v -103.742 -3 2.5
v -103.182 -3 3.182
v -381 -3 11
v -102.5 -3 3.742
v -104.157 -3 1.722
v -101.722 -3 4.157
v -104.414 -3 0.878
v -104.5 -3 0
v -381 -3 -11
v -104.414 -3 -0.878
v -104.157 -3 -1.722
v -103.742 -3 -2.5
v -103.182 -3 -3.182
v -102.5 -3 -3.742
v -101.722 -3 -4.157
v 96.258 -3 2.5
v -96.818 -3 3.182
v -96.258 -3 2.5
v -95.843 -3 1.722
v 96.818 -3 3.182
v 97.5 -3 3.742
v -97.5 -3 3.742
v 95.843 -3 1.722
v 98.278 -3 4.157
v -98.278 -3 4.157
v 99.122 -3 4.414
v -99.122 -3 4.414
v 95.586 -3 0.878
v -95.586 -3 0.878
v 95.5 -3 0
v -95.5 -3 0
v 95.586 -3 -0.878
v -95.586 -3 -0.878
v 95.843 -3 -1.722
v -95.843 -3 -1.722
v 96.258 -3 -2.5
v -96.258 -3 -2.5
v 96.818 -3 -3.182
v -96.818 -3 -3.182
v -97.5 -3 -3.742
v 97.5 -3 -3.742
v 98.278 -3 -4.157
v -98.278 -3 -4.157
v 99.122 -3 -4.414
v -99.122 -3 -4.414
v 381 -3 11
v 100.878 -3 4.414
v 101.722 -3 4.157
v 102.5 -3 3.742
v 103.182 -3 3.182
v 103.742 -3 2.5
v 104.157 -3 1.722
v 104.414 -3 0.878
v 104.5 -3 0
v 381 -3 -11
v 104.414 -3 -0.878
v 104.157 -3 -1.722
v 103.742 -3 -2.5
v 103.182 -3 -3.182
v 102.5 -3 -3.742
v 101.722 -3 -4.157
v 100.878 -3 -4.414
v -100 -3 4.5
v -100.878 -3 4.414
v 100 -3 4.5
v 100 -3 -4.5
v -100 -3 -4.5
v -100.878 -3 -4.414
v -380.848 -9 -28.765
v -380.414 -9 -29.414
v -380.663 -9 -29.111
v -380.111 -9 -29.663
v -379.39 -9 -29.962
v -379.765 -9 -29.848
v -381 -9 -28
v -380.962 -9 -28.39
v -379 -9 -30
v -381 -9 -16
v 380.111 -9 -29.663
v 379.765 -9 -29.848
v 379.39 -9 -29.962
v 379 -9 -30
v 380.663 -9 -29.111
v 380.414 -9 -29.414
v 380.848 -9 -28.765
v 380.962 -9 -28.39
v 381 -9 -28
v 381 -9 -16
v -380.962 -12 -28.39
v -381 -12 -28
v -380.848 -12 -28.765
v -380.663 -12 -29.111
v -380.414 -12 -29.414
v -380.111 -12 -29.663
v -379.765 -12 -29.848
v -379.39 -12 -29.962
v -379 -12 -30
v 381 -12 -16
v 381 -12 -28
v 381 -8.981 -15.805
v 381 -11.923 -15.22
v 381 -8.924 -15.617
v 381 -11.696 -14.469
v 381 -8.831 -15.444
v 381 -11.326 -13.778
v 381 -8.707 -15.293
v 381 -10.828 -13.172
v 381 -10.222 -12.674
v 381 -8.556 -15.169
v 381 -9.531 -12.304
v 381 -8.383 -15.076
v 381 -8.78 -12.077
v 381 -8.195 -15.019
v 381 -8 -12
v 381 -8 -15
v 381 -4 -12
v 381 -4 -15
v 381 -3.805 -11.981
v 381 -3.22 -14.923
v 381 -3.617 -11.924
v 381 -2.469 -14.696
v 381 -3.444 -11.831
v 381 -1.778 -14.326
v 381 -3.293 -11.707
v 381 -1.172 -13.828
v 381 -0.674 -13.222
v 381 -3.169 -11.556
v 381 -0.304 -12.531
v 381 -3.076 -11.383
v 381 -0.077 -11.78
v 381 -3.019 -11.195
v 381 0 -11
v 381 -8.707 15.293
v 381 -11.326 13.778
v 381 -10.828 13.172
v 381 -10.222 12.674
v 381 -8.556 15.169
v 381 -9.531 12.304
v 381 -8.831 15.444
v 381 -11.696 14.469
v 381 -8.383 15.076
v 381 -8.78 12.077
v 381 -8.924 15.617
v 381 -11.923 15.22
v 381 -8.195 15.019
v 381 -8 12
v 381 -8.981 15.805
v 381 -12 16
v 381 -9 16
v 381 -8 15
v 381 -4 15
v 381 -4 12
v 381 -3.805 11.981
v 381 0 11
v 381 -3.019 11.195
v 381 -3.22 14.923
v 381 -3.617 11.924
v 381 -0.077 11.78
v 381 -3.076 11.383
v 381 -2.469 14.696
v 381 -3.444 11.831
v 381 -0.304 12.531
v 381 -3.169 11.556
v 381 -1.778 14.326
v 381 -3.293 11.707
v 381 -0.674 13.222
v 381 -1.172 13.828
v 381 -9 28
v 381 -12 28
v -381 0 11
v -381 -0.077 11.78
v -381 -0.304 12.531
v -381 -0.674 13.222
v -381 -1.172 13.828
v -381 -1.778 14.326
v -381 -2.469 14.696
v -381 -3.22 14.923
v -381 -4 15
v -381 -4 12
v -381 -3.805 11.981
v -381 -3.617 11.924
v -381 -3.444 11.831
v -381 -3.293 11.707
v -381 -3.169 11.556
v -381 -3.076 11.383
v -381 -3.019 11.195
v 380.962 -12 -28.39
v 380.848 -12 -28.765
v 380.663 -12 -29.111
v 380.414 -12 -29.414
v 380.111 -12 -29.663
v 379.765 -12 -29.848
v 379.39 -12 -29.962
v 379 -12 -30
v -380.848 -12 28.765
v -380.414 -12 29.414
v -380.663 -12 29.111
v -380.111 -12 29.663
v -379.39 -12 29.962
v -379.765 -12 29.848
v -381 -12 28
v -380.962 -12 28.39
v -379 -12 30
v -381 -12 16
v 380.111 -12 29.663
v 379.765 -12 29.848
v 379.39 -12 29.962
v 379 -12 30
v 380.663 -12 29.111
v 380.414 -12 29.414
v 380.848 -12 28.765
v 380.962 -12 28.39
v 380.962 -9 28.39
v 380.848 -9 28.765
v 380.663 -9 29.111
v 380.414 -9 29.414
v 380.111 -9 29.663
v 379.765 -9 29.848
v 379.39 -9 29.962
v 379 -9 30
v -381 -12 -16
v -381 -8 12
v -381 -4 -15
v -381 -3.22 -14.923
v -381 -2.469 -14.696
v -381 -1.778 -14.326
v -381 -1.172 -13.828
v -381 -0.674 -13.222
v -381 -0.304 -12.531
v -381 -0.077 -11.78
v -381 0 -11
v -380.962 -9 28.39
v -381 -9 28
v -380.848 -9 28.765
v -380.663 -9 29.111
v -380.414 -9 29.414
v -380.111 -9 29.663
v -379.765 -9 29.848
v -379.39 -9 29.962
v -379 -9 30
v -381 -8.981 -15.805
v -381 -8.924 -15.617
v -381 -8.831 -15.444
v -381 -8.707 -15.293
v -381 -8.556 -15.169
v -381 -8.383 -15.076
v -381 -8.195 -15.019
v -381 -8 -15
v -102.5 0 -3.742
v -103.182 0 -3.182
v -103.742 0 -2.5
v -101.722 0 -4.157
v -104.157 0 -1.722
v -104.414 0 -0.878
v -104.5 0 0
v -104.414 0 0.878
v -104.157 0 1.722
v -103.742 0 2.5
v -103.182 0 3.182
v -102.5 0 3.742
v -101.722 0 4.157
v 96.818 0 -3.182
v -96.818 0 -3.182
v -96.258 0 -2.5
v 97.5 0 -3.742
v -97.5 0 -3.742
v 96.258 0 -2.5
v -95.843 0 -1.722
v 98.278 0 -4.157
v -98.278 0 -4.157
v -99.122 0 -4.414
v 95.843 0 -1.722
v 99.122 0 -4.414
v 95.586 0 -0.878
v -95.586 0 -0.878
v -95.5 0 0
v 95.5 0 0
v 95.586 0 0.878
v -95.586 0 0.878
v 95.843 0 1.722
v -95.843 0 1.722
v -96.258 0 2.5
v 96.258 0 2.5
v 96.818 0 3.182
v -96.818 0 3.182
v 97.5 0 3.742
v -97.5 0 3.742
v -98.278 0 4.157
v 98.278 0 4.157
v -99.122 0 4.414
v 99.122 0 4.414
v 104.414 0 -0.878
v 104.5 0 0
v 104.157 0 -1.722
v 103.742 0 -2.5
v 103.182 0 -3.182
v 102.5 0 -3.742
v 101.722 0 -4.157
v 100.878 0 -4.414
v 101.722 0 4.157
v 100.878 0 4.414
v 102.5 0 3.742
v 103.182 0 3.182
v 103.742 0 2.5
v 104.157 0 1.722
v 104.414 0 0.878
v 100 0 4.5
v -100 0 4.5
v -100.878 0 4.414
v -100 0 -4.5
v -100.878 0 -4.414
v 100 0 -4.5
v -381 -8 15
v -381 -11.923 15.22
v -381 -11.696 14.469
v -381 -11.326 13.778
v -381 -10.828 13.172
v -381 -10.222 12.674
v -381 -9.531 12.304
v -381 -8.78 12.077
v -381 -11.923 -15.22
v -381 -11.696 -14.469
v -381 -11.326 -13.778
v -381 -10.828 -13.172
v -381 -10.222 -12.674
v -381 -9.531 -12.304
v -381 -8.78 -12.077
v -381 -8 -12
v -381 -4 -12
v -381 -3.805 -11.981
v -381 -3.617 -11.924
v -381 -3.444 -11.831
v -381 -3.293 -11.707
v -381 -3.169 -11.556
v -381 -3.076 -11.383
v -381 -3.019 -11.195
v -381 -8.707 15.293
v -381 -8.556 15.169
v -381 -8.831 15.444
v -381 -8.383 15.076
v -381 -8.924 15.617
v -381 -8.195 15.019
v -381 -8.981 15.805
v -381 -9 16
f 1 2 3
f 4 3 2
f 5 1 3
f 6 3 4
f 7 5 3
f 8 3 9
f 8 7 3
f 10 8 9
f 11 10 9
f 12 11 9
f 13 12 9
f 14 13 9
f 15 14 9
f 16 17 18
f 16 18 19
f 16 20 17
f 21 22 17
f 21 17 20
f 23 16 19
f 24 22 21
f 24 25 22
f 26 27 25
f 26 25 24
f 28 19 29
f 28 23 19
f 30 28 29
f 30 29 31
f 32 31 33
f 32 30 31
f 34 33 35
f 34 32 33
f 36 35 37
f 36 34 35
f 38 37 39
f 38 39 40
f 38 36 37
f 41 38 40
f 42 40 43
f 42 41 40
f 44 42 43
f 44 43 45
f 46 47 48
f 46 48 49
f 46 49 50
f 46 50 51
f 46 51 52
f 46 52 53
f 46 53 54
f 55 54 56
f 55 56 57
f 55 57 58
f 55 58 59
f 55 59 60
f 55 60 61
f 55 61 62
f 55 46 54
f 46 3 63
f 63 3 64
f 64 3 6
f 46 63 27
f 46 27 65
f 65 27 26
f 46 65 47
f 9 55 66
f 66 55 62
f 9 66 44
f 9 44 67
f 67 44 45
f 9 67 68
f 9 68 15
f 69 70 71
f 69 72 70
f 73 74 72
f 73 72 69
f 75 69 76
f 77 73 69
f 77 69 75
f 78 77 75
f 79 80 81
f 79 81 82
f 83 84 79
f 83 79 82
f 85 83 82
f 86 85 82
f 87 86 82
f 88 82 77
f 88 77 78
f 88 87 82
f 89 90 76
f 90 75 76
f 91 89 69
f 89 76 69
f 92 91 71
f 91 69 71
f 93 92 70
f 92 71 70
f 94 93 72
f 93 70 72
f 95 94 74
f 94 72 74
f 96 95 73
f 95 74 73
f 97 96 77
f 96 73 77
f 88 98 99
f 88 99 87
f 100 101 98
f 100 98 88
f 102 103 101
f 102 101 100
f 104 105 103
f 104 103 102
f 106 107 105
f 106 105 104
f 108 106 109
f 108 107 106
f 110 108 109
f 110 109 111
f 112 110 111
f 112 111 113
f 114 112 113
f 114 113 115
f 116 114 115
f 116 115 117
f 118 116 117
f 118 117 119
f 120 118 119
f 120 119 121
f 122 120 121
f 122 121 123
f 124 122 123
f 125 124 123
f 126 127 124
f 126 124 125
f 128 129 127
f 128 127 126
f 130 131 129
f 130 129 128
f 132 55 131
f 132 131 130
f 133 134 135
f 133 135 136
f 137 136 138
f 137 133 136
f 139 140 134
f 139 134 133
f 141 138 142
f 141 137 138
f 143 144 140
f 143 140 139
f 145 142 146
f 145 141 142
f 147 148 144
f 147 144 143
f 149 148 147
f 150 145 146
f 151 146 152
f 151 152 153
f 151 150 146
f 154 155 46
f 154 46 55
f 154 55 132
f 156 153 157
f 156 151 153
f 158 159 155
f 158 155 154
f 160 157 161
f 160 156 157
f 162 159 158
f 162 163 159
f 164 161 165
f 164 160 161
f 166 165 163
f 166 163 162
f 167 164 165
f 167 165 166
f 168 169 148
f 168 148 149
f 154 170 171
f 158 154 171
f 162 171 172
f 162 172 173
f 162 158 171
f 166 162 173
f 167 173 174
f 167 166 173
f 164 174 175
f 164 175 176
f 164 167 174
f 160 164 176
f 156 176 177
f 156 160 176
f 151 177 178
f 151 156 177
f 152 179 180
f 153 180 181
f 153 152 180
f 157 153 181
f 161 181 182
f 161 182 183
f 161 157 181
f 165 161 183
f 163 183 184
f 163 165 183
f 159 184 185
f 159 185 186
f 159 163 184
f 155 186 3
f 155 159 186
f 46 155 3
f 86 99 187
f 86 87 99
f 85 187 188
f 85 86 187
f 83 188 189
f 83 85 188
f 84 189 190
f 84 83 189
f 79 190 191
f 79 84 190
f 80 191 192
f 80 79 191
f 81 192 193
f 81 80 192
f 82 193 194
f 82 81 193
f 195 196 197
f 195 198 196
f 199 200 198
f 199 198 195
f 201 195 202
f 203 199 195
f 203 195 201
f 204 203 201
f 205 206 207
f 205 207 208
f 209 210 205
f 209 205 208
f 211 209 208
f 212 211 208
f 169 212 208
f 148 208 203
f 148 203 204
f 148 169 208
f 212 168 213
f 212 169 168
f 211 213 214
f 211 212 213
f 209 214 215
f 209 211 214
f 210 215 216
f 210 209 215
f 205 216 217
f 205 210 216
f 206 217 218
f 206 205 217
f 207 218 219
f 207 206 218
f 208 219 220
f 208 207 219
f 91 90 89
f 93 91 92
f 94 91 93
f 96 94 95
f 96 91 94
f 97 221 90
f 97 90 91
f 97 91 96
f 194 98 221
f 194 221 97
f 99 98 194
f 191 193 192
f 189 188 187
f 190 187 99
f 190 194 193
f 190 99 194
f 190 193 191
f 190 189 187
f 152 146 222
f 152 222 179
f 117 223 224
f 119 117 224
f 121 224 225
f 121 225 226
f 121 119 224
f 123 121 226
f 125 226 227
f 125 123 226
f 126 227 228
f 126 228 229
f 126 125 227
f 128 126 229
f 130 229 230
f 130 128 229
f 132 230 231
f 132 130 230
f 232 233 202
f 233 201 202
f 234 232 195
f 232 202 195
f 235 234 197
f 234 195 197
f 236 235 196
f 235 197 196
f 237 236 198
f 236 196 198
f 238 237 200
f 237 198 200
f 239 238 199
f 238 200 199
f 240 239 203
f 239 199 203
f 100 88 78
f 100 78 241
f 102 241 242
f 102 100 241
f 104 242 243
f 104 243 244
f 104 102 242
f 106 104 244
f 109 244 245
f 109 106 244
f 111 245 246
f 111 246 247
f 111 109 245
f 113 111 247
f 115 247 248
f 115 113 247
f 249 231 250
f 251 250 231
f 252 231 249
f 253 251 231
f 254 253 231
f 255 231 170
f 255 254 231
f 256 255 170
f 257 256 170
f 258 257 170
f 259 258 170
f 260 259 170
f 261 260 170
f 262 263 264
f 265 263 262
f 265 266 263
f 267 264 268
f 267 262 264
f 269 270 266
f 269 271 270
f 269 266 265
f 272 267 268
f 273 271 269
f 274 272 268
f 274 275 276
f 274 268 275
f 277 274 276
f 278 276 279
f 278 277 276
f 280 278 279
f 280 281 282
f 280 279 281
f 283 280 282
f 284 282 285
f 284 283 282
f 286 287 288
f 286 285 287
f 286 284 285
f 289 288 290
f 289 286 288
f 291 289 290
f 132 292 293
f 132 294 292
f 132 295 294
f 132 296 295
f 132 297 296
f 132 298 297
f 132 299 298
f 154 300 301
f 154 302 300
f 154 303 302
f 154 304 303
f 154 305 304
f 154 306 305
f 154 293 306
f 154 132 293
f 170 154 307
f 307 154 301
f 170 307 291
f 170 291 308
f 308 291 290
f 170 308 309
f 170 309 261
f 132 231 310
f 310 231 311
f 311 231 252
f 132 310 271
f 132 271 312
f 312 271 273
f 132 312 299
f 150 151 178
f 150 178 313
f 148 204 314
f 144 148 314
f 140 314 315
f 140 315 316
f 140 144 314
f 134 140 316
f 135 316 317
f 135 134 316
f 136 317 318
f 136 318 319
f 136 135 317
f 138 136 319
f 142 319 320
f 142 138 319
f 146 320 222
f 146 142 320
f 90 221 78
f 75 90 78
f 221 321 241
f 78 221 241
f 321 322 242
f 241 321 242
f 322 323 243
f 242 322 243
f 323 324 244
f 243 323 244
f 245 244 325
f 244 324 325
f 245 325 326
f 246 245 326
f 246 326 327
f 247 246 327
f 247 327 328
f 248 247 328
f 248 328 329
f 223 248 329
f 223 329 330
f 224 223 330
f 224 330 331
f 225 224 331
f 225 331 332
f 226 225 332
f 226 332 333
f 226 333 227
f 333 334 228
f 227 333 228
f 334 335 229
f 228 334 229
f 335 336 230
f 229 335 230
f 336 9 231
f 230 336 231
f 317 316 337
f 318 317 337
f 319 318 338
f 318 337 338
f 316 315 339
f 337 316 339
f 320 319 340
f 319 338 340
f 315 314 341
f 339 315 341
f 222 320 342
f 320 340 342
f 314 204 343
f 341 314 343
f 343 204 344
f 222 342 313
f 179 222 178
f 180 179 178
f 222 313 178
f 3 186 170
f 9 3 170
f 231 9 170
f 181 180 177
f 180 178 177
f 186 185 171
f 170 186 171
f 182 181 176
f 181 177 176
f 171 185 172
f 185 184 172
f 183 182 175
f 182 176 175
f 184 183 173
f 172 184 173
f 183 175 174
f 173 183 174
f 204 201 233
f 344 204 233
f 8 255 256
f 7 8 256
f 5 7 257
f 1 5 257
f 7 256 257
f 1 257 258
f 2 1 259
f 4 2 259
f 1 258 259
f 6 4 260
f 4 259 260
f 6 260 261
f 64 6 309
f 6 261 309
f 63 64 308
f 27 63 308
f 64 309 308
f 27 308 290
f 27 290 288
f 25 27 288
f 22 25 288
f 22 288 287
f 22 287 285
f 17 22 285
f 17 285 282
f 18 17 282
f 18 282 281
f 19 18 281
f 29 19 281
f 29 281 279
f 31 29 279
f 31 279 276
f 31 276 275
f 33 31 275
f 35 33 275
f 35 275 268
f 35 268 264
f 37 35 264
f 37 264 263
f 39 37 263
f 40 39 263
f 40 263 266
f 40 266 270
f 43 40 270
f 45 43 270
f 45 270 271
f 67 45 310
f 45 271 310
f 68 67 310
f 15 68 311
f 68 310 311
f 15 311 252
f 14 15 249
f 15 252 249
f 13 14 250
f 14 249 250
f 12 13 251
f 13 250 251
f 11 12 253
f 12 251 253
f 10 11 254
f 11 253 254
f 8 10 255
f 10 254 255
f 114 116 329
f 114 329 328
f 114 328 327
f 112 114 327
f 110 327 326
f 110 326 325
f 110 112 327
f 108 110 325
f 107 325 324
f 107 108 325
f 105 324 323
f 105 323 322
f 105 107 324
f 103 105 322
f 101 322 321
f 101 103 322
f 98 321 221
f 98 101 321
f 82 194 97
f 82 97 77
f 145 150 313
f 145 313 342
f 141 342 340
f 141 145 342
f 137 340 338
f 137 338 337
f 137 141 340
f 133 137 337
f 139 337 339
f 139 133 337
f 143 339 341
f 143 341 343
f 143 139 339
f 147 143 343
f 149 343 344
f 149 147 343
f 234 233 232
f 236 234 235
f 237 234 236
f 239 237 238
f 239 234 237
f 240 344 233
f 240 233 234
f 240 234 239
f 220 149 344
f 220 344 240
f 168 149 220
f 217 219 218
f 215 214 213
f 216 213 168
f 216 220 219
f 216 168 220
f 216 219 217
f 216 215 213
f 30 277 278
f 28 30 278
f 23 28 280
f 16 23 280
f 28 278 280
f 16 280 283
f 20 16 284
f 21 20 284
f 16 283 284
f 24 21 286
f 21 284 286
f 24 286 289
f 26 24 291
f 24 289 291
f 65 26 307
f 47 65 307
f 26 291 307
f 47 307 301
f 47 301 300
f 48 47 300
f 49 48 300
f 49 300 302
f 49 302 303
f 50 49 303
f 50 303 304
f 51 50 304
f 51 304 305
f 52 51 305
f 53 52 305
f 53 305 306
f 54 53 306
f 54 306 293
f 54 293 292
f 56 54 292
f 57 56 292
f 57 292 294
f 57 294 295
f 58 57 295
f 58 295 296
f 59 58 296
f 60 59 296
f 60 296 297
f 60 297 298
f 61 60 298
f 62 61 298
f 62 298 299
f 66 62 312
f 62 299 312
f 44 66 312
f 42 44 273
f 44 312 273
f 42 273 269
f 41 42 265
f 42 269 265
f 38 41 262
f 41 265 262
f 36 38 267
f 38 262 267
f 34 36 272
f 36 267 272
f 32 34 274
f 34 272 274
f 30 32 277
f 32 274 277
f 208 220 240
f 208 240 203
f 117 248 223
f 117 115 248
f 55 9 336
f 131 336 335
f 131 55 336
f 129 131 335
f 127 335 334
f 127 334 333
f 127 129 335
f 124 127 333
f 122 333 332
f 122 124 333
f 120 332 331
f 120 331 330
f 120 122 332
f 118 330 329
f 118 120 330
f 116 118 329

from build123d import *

# Parameters (mm, degrees)
F1_DEPTH = 381
F2_R     = 4.5
F3_DEPTH = 12.001
F4_R     = 2


with BuildPart() as f1:
    # F0 (on Right) → F1 (new body, symmetric)
    with BuildSketch(Plane.YZ):
        with BuildLine():
            Line((0, -11), (0, 0))
            Line((0, 0), (0, 11))
            ThreePointArc((0, 11), (-1.171573, 13.828427), (-4, 15))
            Line((-4, 15), (-8, 15))
            ThreePointArc((-8, 15), (-8.707107, 15.292893), (-9, 16))
            Line((-9, 16), (-9, 30))
            Line((-9, 30), (-12, 30))
            Line((-12, 30), (-12, 16))
            ThreePointArc((-12, 16), (-10.828427, 13.171573), (-8, 12))
            Line((-8, 12), (-4, 12))
            ThreePointArc((-4, 12), (-3.292893, 11.707107), (-3, 11))
            Line((-3, 11), (-3, 0))
            Line((-3, 0), (-3, -11))
            ThreePointArc((-3, -11), (-3.292893, -11.707107), (-4, -12))
            Line((-4, -12), (-8, -12))
            ThreePointArc((-8, -12), (-10.828427, -13.171573), (-12, -16))
            Line((-12, -16), (-12, -30))
            Line((-12, -30), (-9, -30))
            Line((-9, -30), (-9, -16))
            ThreePointArc((-9, -16), (-8.707107, -15.292893), (-8, -15))
            Line((-8, -15), (-4, -15))
            ThreePointArc((-4, -15), (-1.171573, -13.828427), (0, -11))
        make_face()
    extrude(amount=F1_DEPTH, both=True)

    # F2 (on face) → F3 (cut, through all)
    with BuildSketch(Plane(origin=(0, 0, 0), x_dir=(-1, 0, 0), z_dir=(0, 1, 0))):
        with Locations((-100, 0)):
            Circle(F2_R)
        with Locations((100, 0)):
            Circle(F2_R)
    extrude(amount=-F3_DEPTH, mode=Mode.SUBTRACT)

    # F4
    f4_edges = [f1.edges().sort_by_distance(p)[0] for p in [
        (-381, -10.5, 30),
        (-381, -10.5, -30),
        (381, -10.5, 30),
        (381, -10.5, -30),
    ]]
    fillet(f4_edges, radius=F4_R)


solid = f1.part
